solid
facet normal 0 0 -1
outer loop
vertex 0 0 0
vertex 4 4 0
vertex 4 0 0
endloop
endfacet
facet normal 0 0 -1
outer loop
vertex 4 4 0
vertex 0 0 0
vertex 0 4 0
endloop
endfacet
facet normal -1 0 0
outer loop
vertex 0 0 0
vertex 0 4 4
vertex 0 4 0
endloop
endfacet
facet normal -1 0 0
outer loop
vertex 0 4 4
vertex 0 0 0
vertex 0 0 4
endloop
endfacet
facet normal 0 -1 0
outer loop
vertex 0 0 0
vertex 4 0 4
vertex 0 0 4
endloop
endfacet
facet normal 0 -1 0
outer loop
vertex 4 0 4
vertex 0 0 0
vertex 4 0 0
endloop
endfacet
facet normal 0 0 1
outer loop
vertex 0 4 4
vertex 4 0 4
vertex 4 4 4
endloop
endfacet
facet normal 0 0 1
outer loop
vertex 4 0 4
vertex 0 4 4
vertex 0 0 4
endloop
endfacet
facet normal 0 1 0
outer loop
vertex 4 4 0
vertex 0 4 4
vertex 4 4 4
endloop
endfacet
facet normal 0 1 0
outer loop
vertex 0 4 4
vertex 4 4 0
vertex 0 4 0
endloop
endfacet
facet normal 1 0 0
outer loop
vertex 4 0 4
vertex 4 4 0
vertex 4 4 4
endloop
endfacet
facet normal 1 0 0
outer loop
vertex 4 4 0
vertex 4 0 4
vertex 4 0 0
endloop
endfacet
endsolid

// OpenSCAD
union() {
    translate([0.0, 0.0, 0.0]) cube([1, 1, 1]);
    translate([0.0, 0.0, 1.0]) cube([1, 1, 1]);
    translate([0.0, 0.0, 2.0]) cube([1, 1, 1]);
    translate([0.0, 0.0, 3.0]) cube([1, 1, 1]);
    translate([0.0, 1.0, 0.0]) cube([1, 1, 1]);
    translate([0.0, 1.0, 1.0]) cube([1, 1, 1]);
    translate([0.0, 1.0, 2.0]) cube([1, 1, 1]);
    translate([0.0, 1.0, 3.0]) cube([1, 1, 1]);
    translate([0.0, 2.0, 0.0]) cube([1, 1, 1]);
    translate([0.0, 2.0, 1.0]) cube([1, 1, 1]);
    translate([0.0, 2.0, 2.0]) cube([1, 1, 1]);
    translate([0.0, 2.0, 3.0]) cube([1, 1, 1]);
    translate([0.0, 3.0, 0.0]) cube([1, 1, 1]);
    translate([0.0, 3.0, 1.0]) cube([1, 1, 1]);
    translate([0.0, 3.0, 2.0]) cube([1, 1, 1]);
    translate([0.0, 3.0, 3.0]) cube([1, 1, 1]);
    translate([1.0, 0.0, 0.0]) cube([1, 1, 1]);
    translate([1.0, 0.0, 1.0]) cube([1, 1, 1]);
    translate([1.0, 0.0, 2.0]) cube([1, 1, 1]);
    translate([1.0, 0.0, 3.0]) cube([1, 1, 1]);
    translate([1.0, 1.0, 0.0]) cube([1, 1, 1]);
    translate([1.0, 1.0, 1.0]) cube([1, 1, 1]);
    translate([1.0, 1.0, 2.0]) cube([1, 1, 1]);
    translate([1.0, 1.0, 3.0]) cube([1, 1, 1]);
    translate([1.0, 2.0, 0.0]) cube([1, 1, 1]);
    translate([1.0, 2.0, 1.0]) cube([1, 1, 1]);
    translate([1.0, 2.0, 2.0]) cube([1, 1, 1]);
    translate([1.0, 2.0, 3.0]) cube([1, 1, 1]);
    translate([1.0, 3.0, 0.0]) cube([1, 1, 1]);
    translate([1.0, 3.0, 1.0]) cube([1, 1, 1]);
    translate([1.0, 3.0, 2.0]) cube([1, 1, 1]);
    translate([1.0, 3.0, 3.0]) cube([1, 1, 1]);
    translate([2.0, 0.0, 0.0]) cube([1, 1, 1]);
    translate([2.0, 0.0, 1.0]) cube([1, 1, 1]);
    translate([2.0, 0.0, 2.0]) cube([1, 1, 1]);
    translate([2.0, 0.0, 3.0]) cube([1, 1, 1]);
    translate([2.0, 1.0, 0.0]) cube([1, 1, 1]);
    translate([2.0, 1.0, 1.0]) cube([1, 1, 1]);
    translate([2.0, 1.0, 2.0]) cube([1, 1, 1]);
    translate([2.0, 1.0, 3.0]) cube([1, 1, 1]);
    translate([2.0, 2.0, 0.0]) cube([1, 1, 1]);
    translate([2.0, 2.0, 1.0]) cube([1, 1, 1]);
    translate([2.0, 2.0, 2.0]) cube([1, 1, 1]);
    translate([2.0, 2.0, 3.0]) cube([1, 1, 1]);
    translate([2.0, 3.0, 0.0]) cube([1, 1, 1]);
    translate([2.0, 3.0, 1.0]) cube([1, 1, 1]);
    translate([2.0, 3.0, 2.0]) cube([1, 1, 1]);
    translate([2.0, 3.0, 3.0]) cube([1, 1, 1]);
    translate([3.0, 0.0, 0.0]) cube([1, 1, 1]);
    translate([3.0, 0.0, 1.0]) cube([1, 1, 1]);
    translate([3.0, 0.0, 2.0]) cube([1, 1, 1]);
    translate([3.0, 0.0, 3.0]) cube([1, 1, 1]);
    translate([3.0, 1.0, 0.0]) cube([1, 1, 1]);
    translate([3.0, 1.0, 1.0]) cube([1, 1, 1]);
    translate([3.0, 1.0, 2.0]) cube([1, 1, 1]);
    translate([3.0, 1.0, 3.0]) cube([1, 1, 1]);
    translate([3.0, 2.0, 0.0]) cube([1, 1, 1]);
    translate([3.0, 2.0, 1.0]) cube([1, 1, 1]);
    translate([3.0, 2.0, 2.0]) cube([1, 1, 1]);
    translate([3.0, 2.0, 3.0]) cube([1, 1, 1]);
    translate([3.0, 3.0, 0.0]) cube([1, 1, 1]);
    translate([3.0, 3.0, 1.0]) cube([1, 1, 1]);
    translate([3.0, 3.0, 2.0]) cube([1, 1, 1]);
    translate([3.0, 3.0, 3.0]) cube([1, 1, 1]);
}
